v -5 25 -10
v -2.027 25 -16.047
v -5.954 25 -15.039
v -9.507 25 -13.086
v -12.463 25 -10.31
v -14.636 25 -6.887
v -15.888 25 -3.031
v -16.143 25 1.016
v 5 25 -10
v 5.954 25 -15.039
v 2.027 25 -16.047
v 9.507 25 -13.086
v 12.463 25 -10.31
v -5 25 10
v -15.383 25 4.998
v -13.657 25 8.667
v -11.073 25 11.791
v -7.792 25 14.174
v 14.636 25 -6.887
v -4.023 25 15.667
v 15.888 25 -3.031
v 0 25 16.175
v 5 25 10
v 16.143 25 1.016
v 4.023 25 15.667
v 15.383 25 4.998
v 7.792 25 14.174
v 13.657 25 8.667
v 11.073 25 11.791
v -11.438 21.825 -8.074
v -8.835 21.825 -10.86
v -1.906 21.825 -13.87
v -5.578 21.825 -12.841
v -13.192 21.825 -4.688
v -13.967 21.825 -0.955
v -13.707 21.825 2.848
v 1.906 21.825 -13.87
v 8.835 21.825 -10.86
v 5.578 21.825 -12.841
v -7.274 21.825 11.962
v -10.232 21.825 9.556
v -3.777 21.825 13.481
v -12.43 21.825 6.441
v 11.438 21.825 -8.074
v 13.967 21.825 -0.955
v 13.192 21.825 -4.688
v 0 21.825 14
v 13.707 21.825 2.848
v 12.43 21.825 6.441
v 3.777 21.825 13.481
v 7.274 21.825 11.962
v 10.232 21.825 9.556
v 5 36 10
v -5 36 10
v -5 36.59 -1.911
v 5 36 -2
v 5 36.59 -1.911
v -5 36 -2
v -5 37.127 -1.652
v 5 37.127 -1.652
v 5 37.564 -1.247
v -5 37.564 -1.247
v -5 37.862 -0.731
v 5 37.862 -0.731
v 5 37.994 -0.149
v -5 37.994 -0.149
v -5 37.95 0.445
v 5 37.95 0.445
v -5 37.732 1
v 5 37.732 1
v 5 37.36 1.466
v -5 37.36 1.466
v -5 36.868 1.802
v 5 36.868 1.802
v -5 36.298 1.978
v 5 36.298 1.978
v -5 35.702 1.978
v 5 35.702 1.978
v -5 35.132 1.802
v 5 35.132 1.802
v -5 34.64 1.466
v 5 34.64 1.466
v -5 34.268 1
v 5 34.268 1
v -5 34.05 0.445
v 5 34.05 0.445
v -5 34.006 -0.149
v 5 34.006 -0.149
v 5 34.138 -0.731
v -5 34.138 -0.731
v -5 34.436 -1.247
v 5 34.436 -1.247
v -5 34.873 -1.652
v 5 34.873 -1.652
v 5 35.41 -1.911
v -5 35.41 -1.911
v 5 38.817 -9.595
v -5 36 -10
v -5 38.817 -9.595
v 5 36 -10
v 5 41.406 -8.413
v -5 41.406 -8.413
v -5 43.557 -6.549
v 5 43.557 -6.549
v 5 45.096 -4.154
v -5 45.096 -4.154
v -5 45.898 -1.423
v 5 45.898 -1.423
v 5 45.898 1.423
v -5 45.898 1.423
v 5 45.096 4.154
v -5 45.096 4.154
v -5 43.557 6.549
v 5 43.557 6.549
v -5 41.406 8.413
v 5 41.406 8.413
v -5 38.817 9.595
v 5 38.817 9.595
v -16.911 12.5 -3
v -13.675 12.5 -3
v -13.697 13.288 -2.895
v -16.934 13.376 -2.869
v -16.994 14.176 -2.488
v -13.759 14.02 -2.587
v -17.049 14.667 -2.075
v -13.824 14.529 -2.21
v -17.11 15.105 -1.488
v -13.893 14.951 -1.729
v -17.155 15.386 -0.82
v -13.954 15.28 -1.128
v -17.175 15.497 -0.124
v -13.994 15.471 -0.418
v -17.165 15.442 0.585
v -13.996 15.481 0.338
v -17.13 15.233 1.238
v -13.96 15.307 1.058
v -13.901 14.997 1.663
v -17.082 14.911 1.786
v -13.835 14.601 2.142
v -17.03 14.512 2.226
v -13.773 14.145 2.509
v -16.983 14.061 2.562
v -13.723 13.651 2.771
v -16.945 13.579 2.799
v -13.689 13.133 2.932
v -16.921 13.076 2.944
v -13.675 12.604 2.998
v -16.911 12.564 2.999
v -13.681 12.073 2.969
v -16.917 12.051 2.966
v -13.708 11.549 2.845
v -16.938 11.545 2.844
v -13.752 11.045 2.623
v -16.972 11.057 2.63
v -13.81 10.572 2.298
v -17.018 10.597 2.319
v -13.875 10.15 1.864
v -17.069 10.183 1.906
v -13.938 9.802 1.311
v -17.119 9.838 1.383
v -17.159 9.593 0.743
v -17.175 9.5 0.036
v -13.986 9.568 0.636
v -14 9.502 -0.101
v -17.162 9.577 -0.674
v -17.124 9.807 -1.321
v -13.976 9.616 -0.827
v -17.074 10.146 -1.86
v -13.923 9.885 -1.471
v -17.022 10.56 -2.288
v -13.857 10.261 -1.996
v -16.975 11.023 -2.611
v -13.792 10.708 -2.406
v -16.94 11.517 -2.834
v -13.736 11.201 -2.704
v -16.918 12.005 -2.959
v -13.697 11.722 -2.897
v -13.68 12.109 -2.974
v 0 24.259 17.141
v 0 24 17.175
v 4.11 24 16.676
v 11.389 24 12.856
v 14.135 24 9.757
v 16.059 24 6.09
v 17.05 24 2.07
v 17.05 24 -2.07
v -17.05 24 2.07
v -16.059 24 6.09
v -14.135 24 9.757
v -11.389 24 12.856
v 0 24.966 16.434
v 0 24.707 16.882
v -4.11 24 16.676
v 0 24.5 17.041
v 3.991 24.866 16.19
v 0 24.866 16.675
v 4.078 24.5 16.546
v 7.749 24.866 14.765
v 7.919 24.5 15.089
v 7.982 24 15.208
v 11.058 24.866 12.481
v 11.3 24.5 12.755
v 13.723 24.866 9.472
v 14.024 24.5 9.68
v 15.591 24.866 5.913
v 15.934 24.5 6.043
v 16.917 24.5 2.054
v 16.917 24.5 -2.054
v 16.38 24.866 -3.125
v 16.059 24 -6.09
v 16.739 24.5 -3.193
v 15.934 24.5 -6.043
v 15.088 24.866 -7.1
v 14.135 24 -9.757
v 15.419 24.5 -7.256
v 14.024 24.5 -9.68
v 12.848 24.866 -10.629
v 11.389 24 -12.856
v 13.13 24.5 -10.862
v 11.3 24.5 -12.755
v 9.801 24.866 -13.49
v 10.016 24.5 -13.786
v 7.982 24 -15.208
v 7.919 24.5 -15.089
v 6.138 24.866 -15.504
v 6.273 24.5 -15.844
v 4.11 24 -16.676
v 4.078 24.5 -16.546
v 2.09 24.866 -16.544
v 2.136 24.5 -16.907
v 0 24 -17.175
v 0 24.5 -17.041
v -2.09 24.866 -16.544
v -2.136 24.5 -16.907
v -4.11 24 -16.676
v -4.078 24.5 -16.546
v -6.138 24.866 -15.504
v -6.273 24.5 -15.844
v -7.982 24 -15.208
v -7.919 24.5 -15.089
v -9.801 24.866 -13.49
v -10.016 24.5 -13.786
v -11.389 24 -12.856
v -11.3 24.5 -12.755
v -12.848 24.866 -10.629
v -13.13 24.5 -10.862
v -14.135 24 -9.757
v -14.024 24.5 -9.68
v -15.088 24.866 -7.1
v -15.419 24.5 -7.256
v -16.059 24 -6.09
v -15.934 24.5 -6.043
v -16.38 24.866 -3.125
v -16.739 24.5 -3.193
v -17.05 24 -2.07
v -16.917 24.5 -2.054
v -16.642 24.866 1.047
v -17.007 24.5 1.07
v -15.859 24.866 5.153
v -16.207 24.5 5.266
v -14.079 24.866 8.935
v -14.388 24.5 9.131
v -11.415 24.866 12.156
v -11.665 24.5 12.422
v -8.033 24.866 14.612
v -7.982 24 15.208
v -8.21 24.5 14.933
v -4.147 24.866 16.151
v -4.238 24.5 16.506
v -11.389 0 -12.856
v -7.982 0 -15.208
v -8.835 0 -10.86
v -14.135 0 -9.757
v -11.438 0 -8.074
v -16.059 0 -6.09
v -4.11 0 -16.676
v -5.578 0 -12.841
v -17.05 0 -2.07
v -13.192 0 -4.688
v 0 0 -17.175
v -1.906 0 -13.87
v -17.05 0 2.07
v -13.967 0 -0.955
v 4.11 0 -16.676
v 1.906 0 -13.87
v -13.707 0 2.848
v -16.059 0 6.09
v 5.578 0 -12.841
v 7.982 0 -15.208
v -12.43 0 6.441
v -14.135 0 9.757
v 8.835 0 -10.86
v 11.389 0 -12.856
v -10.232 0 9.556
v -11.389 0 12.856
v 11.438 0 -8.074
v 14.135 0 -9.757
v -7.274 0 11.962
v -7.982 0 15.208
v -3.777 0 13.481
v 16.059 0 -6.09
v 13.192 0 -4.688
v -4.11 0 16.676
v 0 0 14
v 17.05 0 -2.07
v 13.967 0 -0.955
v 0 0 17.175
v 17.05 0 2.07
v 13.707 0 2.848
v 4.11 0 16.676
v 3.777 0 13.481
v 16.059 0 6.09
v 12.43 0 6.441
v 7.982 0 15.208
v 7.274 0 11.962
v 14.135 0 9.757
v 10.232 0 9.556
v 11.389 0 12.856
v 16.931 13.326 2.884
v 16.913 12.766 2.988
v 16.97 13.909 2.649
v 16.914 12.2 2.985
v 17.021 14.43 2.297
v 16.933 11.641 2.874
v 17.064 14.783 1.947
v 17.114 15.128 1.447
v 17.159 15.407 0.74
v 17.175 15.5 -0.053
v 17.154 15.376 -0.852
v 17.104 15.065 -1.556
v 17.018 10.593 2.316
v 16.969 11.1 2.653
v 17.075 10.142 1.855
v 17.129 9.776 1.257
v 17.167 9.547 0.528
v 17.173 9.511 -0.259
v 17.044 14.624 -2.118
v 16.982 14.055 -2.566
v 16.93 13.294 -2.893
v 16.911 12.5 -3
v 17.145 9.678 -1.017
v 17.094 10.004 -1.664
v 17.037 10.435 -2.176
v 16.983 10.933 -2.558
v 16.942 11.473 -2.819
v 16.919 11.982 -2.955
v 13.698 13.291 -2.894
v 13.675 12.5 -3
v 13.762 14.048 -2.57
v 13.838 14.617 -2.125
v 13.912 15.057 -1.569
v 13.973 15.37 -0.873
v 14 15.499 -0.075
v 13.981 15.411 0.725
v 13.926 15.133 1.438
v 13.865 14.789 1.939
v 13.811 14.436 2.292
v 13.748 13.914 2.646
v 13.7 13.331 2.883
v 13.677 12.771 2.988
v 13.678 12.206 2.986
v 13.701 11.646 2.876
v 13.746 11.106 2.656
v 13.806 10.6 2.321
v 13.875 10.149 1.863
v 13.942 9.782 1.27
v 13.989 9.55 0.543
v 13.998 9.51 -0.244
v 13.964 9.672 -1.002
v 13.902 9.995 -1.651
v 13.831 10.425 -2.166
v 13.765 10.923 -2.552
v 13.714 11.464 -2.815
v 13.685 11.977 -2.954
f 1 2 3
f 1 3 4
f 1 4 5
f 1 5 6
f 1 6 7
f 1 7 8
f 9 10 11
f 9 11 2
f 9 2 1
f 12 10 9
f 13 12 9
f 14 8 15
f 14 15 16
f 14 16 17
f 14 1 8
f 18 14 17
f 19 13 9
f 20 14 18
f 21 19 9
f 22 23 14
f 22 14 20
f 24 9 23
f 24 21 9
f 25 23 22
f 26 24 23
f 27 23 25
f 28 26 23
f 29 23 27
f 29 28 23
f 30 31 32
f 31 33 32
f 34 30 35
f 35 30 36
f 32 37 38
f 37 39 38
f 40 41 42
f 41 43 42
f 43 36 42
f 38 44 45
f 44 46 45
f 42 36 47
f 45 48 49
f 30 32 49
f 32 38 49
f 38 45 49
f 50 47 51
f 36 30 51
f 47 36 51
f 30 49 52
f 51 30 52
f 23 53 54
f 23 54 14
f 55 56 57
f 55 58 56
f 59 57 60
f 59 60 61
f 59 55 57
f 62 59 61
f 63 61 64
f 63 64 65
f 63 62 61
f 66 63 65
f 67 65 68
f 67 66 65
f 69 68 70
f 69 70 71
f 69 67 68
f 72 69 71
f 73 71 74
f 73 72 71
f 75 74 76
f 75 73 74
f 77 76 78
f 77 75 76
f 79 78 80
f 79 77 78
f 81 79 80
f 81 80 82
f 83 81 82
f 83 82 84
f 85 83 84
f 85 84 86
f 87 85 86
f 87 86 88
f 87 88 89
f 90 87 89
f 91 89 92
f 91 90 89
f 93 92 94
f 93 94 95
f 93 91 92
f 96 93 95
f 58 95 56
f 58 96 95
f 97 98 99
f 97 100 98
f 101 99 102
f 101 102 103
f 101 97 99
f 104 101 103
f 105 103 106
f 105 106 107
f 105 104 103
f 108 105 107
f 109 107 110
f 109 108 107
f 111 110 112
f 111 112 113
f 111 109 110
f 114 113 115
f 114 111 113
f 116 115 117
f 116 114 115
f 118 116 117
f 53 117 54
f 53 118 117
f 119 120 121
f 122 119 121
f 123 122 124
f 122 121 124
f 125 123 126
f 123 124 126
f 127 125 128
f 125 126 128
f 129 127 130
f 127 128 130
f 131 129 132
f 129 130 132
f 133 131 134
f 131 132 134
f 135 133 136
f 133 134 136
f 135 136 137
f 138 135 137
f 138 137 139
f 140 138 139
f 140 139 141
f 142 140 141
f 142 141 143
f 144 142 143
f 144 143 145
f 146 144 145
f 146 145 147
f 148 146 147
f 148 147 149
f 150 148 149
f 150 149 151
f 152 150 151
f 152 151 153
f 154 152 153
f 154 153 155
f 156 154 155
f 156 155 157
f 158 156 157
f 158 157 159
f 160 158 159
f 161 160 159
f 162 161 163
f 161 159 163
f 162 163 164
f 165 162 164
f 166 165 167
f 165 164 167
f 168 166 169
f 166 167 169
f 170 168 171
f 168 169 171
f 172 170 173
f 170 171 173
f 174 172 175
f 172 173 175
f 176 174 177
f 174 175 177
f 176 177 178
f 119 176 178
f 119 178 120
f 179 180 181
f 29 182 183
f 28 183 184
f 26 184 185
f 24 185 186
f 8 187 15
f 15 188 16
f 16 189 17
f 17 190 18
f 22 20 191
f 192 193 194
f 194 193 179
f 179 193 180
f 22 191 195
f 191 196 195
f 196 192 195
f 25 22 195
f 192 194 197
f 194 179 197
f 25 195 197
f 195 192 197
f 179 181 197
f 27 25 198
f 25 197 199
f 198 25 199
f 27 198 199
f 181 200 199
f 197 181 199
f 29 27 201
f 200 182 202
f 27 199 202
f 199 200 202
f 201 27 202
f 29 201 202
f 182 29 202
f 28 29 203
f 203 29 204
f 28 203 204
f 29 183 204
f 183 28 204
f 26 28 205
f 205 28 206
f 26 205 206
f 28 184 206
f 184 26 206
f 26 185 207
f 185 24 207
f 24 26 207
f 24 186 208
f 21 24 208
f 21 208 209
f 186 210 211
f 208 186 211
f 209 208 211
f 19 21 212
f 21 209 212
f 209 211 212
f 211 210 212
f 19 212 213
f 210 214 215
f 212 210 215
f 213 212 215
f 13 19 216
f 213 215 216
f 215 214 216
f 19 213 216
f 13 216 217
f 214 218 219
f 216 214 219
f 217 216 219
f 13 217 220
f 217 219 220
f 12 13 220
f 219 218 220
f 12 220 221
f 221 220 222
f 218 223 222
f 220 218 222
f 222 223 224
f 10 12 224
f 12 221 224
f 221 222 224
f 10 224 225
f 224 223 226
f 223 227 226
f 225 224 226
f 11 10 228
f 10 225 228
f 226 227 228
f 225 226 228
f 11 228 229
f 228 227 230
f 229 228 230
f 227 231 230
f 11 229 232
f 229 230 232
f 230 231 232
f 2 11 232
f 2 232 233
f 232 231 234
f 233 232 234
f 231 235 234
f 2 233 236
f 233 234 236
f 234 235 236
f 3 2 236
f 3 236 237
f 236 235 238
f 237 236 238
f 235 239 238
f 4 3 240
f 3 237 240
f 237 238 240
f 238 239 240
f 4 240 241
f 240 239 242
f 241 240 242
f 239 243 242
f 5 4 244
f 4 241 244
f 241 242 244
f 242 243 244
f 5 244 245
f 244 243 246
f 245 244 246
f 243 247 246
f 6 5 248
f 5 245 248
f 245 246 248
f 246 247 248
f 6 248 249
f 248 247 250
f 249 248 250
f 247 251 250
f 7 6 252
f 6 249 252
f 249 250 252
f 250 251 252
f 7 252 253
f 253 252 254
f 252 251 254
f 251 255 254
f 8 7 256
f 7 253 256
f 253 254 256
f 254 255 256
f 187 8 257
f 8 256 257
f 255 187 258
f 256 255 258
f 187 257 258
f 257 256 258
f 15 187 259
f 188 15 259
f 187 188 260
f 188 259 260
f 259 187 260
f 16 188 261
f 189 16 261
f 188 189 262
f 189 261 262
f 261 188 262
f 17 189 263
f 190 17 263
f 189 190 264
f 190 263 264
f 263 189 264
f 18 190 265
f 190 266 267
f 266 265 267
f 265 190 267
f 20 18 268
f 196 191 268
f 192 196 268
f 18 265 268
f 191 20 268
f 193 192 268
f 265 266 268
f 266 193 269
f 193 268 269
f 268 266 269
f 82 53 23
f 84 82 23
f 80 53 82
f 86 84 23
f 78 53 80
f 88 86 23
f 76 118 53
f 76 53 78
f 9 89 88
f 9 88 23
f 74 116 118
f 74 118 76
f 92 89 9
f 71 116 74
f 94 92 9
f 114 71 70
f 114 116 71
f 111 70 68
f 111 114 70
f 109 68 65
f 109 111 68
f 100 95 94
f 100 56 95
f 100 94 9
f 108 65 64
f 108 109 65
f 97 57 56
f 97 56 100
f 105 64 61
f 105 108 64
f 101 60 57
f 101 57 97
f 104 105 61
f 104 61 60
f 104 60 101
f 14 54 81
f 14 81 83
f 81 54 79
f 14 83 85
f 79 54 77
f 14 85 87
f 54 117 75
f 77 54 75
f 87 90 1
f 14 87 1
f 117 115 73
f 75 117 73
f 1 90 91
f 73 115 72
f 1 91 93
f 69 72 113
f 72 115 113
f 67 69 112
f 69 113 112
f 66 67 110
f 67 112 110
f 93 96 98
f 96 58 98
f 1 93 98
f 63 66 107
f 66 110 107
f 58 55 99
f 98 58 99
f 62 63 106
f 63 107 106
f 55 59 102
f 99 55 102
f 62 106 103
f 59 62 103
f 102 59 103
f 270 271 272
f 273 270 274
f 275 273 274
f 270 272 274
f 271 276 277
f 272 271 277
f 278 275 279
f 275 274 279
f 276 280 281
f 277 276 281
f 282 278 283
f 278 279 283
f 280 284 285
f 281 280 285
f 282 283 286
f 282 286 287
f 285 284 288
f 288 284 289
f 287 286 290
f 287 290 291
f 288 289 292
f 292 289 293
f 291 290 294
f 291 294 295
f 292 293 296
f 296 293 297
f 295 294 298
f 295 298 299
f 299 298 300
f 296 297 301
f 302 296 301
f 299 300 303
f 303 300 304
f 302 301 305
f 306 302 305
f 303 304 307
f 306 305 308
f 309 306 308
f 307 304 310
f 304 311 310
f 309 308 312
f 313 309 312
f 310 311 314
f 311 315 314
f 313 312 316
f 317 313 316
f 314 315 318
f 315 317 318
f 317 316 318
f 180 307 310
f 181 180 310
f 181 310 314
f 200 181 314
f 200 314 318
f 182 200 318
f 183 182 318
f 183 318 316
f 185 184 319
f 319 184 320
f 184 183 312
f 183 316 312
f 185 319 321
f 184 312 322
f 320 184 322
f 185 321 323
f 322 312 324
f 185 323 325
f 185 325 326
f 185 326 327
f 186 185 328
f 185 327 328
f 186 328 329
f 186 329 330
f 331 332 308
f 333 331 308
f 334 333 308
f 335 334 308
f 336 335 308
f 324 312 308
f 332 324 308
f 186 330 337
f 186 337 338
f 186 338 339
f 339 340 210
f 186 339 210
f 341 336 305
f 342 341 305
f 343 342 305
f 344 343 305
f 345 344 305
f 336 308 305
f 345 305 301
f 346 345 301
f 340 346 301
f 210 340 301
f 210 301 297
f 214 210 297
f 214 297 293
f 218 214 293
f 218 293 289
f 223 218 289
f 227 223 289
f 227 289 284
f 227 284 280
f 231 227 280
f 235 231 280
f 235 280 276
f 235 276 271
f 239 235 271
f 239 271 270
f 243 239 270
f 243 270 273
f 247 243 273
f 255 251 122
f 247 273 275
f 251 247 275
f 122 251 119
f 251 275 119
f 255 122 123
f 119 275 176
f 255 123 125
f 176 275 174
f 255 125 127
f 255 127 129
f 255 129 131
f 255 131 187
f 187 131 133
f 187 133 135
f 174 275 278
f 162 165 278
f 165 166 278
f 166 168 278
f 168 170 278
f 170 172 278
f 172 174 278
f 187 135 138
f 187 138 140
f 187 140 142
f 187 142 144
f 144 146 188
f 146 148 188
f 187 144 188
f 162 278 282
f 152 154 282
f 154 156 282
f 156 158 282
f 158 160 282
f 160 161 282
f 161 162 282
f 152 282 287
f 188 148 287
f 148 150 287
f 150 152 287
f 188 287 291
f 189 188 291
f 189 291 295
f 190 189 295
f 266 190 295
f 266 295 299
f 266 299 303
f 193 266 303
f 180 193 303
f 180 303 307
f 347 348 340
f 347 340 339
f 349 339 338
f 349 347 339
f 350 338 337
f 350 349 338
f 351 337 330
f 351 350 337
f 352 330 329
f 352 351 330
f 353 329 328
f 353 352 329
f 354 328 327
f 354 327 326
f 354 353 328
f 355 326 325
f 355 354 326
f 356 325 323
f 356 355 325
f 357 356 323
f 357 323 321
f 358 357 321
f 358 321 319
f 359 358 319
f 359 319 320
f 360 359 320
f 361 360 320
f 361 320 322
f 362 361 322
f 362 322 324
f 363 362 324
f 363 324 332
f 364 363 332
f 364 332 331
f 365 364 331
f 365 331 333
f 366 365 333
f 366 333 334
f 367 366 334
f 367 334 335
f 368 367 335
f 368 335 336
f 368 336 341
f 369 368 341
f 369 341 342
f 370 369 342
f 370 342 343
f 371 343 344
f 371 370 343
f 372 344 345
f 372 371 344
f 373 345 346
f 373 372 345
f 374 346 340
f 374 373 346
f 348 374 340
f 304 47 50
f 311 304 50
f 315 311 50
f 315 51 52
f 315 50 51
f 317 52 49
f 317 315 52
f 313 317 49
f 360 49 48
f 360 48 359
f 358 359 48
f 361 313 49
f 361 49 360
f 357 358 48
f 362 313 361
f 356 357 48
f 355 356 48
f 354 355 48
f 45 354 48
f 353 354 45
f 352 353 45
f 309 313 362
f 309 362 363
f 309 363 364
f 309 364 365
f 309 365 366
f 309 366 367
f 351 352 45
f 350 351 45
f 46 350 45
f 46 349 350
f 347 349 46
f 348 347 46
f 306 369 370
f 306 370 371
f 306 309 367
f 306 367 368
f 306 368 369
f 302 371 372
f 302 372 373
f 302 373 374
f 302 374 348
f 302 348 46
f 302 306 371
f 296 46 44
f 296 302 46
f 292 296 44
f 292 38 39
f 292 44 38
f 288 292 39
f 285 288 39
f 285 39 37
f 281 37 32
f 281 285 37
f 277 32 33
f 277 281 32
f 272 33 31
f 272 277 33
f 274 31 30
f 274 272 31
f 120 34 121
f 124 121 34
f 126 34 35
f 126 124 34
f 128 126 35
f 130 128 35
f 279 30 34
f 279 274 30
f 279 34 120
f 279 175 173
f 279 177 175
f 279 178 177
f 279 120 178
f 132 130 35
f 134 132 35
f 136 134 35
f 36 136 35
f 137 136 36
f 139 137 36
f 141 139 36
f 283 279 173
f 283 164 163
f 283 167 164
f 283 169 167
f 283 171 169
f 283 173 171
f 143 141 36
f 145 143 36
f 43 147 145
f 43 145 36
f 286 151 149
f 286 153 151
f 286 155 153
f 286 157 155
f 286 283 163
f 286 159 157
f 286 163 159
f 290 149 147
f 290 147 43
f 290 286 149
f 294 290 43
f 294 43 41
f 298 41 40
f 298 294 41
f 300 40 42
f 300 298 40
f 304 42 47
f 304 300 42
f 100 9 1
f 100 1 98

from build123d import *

# Parameters (mm, degrees)
SKETCH1_R               = 17.175
BOSS_EXTRUDE2_DEPTH     = 25
SHELL1_T                = -3.175
SKETCH3_R               = 3
CUT_EXTRUDE1_DEPTH      = 35.856294267
CUT_EXTRUDE1_DEPTH_BACK = 35.856294267
SKETCH5_R               = 2
BOSS_EXTRUDE3_DEPTH     = 5
FILLET1_R               = 1


with BuildPart() as part:
    # Sketch1 → Boss-Extrude2 (new body)
    with BuildSketch(Plane(origin=(0, 0, 0), x_dir=(1, 0, 0), z_dir=(0, 1, 0))):
        with Locations(Location((0, 0, 0), (0, 0, 270))):
            Circle(SKETCH1_R)
    extrude(amount=BOSS_EXTRUDE2_DEPTH)

    # Shell1
    shell1_openings = [part.faces().sort_by_distance(p)[0] for p in [
        (0, 0, 0),
    ]]
    offset(amount=SHELL1_T, openings=shell1_openings, kind=Kind.INTERSECTION)

    # Sketch3 → Cut-Extrude1 (cut, two sides)
    with BuildSketch(Plane(origin=(0, 0, 0), x_dir=(0, 0, -1), z_dir=(1, 0, 0))) as cut_extrude1_sk:
        with Locations((0, 12.5)):
            Circle(SKETCH3_R)
    extrude(amount=CUT_EXTRUDE1_DEPTH, mode=Mode.SUBTRACT)
    extrude(cut_extrude1_sk.sketch, amount=-CUT_EXTRUDE1_DEPTH_BACK, mode=Mode.SUBTRACT)

    # Sketch5 → Boss-Extrude3 (add, symmetric)
    with BuildSketch(Plane(origin=(0, 0, 0), x_dir=(0, 0, -1), z_dir=(1, 0, 0))):
        with BuildLine():
            Line((-10, 36), (-10, 25))
            Line((-10, 25), (-10, 24.25))
            Line((-10, 24.25), (10, 24.25))
            Line((10, 24.25), (10, 25))
            Line((10, 25), (10, 36))
            ThreePointArc((10, 36), (0, 46), (-10, 36))
        make_face()
        with Locations((0, 36)):
            Circle(SKETCH5_R, mode=Mode.SUBTRACT)
    extrude(amount=BOSS_EXTRUDE3_DEPTH, both=True)

    # Fillet1
    fillet1_edges = [part.edges().sort_by_distance(p)[0] for p in [
        (0, 25, -17.175),
    ]]
    fillet(fillet1_edges, radius=FILLET1_R)


solid = part.part
